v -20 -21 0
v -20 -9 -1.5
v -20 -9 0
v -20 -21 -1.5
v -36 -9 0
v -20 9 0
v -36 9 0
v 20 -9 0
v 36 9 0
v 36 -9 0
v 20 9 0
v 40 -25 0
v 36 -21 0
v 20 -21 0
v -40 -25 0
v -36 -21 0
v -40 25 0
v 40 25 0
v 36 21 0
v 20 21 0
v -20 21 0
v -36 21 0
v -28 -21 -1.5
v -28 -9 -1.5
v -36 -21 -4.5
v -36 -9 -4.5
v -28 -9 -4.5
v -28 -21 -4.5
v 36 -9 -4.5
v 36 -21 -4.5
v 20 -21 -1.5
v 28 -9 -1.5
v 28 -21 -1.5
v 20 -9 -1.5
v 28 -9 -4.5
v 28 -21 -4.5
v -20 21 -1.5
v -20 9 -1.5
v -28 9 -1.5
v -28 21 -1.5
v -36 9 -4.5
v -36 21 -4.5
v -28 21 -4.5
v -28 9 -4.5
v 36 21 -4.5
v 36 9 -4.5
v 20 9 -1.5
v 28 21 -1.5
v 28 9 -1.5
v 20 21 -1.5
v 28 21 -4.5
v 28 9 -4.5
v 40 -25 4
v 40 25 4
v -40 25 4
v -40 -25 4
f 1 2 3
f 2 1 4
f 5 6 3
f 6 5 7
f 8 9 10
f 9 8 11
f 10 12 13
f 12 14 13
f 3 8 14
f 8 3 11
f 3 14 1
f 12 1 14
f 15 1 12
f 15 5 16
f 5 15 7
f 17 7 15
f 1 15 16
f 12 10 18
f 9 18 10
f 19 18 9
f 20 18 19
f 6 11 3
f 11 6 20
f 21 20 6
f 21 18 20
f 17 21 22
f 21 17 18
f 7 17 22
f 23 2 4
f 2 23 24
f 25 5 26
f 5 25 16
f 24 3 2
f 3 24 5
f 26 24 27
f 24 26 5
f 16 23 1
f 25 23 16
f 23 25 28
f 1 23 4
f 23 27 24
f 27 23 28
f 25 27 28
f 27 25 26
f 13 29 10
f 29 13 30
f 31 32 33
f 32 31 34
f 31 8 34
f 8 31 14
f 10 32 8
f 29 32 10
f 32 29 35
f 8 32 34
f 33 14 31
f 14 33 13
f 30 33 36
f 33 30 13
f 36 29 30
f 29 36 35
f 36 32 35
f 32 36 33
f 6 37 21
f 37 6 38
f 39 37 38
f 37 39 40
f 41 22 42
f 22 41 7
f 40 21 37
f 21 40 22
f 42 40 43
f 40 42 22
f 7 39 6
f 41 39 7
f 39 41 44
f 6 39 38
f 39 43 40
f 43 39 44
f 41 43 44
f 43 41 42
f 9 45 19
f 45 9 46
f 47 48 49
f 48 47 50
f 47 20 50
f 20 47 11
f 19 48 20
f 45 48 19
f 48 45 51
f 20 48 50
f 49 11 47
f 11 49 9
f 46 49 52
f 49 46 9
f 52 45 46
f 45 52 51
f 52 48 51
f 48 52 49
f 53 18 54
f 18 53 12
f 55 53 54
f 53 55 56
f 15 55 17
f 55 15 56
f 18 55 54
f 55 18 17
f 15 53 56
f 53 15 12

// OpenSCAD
// === Slab with Two-Tier Underside Protrusions ===

// Main slab dimensions
slab_length = 80;    // x-axis extent
slab_width  = 50;    // y-axis extent
slab_thick  = 4;     // z-axis thickness

// Shallow pad dimensions (first tier)
pad_length = 16;    // x-axis
pad_width  = 12;    // y-axis
pad_height = 1.5;   // z-axis (shallow)

// Deep foot dimensions (second tier, narrower in x)
foot_length = 8;    // x-axis (narrower than pad, shares front/back and one side edge)
foot_height = 3;    // z-axis (deeper than pad)

// Margin from slab edges to pad edges
margin_x = 4;
margin_y = 4;

$fn = 100;

// --- Main Model ---
union() {
    // Top slab
    translate([0, 0, slab_thick / 2])
        cube([slab_length, slab_width, slab_thick], center = true);

    // Four corner pad+foot assemblies
    // Front-left: foot shares left edge of pad
    pad_and_foot(
        cx = -slab_length/2 + margin_x + pad_length/2,
        cy = -slab_width/2 + margin_y + pad_width/2,
        align_left = true
    );

    // Front-right: foot shares right edge of pad
    pad_and_foot(
        cx = slab_length/2 - margin_x - pad_length/2,
        cy = -slab_width/2 + margin_y + pad_width/2,
        align_left = false
    );

    // Back-left: foot shares left edge of pad
    pad_and_foot(
        cx = -slab_length/2 + margin_x + pad_length/2,
        cy = slab_width/2 - margin_y - pad_width/2,
        align_left = true
    );

    // Back-right: foot shares right edge of pad
    pad_and_foot(
        cx = slab_length/2 - margin_x - pad_length/2,
        cy = slab_width/2 - margin_y - pad_width/2,
        align_left = false
    );
}

// --- Module: shallow pad + deep foot ---
// cx, cy: center position of the pad on the x-y plane
// align_left: if true foot aligns to left edge; if false foot aligns to right edge
module pad_and_foot(cx, cy, align_left) {
    // Shallow pad (first tier)
    translate([cx, cy, -pad_height / 2])
        cube([pad_length, pad_width, pad_height], center = true);

    // Deep foot (second tier)
    // Shares front and back (y) edges with pad; shares left or right (x) edge
    foot_cx = align_left
        ? cx - pad_length/2 + foot_length/2    // left-aligned
        : cx + pad_length/2 - foot_length/2;   // right-aligned

    translate([foot_cx, cy, -pad_height - foot_height / 2])
        cube([foot_length, pad_width, foot_height], center = true);
}
